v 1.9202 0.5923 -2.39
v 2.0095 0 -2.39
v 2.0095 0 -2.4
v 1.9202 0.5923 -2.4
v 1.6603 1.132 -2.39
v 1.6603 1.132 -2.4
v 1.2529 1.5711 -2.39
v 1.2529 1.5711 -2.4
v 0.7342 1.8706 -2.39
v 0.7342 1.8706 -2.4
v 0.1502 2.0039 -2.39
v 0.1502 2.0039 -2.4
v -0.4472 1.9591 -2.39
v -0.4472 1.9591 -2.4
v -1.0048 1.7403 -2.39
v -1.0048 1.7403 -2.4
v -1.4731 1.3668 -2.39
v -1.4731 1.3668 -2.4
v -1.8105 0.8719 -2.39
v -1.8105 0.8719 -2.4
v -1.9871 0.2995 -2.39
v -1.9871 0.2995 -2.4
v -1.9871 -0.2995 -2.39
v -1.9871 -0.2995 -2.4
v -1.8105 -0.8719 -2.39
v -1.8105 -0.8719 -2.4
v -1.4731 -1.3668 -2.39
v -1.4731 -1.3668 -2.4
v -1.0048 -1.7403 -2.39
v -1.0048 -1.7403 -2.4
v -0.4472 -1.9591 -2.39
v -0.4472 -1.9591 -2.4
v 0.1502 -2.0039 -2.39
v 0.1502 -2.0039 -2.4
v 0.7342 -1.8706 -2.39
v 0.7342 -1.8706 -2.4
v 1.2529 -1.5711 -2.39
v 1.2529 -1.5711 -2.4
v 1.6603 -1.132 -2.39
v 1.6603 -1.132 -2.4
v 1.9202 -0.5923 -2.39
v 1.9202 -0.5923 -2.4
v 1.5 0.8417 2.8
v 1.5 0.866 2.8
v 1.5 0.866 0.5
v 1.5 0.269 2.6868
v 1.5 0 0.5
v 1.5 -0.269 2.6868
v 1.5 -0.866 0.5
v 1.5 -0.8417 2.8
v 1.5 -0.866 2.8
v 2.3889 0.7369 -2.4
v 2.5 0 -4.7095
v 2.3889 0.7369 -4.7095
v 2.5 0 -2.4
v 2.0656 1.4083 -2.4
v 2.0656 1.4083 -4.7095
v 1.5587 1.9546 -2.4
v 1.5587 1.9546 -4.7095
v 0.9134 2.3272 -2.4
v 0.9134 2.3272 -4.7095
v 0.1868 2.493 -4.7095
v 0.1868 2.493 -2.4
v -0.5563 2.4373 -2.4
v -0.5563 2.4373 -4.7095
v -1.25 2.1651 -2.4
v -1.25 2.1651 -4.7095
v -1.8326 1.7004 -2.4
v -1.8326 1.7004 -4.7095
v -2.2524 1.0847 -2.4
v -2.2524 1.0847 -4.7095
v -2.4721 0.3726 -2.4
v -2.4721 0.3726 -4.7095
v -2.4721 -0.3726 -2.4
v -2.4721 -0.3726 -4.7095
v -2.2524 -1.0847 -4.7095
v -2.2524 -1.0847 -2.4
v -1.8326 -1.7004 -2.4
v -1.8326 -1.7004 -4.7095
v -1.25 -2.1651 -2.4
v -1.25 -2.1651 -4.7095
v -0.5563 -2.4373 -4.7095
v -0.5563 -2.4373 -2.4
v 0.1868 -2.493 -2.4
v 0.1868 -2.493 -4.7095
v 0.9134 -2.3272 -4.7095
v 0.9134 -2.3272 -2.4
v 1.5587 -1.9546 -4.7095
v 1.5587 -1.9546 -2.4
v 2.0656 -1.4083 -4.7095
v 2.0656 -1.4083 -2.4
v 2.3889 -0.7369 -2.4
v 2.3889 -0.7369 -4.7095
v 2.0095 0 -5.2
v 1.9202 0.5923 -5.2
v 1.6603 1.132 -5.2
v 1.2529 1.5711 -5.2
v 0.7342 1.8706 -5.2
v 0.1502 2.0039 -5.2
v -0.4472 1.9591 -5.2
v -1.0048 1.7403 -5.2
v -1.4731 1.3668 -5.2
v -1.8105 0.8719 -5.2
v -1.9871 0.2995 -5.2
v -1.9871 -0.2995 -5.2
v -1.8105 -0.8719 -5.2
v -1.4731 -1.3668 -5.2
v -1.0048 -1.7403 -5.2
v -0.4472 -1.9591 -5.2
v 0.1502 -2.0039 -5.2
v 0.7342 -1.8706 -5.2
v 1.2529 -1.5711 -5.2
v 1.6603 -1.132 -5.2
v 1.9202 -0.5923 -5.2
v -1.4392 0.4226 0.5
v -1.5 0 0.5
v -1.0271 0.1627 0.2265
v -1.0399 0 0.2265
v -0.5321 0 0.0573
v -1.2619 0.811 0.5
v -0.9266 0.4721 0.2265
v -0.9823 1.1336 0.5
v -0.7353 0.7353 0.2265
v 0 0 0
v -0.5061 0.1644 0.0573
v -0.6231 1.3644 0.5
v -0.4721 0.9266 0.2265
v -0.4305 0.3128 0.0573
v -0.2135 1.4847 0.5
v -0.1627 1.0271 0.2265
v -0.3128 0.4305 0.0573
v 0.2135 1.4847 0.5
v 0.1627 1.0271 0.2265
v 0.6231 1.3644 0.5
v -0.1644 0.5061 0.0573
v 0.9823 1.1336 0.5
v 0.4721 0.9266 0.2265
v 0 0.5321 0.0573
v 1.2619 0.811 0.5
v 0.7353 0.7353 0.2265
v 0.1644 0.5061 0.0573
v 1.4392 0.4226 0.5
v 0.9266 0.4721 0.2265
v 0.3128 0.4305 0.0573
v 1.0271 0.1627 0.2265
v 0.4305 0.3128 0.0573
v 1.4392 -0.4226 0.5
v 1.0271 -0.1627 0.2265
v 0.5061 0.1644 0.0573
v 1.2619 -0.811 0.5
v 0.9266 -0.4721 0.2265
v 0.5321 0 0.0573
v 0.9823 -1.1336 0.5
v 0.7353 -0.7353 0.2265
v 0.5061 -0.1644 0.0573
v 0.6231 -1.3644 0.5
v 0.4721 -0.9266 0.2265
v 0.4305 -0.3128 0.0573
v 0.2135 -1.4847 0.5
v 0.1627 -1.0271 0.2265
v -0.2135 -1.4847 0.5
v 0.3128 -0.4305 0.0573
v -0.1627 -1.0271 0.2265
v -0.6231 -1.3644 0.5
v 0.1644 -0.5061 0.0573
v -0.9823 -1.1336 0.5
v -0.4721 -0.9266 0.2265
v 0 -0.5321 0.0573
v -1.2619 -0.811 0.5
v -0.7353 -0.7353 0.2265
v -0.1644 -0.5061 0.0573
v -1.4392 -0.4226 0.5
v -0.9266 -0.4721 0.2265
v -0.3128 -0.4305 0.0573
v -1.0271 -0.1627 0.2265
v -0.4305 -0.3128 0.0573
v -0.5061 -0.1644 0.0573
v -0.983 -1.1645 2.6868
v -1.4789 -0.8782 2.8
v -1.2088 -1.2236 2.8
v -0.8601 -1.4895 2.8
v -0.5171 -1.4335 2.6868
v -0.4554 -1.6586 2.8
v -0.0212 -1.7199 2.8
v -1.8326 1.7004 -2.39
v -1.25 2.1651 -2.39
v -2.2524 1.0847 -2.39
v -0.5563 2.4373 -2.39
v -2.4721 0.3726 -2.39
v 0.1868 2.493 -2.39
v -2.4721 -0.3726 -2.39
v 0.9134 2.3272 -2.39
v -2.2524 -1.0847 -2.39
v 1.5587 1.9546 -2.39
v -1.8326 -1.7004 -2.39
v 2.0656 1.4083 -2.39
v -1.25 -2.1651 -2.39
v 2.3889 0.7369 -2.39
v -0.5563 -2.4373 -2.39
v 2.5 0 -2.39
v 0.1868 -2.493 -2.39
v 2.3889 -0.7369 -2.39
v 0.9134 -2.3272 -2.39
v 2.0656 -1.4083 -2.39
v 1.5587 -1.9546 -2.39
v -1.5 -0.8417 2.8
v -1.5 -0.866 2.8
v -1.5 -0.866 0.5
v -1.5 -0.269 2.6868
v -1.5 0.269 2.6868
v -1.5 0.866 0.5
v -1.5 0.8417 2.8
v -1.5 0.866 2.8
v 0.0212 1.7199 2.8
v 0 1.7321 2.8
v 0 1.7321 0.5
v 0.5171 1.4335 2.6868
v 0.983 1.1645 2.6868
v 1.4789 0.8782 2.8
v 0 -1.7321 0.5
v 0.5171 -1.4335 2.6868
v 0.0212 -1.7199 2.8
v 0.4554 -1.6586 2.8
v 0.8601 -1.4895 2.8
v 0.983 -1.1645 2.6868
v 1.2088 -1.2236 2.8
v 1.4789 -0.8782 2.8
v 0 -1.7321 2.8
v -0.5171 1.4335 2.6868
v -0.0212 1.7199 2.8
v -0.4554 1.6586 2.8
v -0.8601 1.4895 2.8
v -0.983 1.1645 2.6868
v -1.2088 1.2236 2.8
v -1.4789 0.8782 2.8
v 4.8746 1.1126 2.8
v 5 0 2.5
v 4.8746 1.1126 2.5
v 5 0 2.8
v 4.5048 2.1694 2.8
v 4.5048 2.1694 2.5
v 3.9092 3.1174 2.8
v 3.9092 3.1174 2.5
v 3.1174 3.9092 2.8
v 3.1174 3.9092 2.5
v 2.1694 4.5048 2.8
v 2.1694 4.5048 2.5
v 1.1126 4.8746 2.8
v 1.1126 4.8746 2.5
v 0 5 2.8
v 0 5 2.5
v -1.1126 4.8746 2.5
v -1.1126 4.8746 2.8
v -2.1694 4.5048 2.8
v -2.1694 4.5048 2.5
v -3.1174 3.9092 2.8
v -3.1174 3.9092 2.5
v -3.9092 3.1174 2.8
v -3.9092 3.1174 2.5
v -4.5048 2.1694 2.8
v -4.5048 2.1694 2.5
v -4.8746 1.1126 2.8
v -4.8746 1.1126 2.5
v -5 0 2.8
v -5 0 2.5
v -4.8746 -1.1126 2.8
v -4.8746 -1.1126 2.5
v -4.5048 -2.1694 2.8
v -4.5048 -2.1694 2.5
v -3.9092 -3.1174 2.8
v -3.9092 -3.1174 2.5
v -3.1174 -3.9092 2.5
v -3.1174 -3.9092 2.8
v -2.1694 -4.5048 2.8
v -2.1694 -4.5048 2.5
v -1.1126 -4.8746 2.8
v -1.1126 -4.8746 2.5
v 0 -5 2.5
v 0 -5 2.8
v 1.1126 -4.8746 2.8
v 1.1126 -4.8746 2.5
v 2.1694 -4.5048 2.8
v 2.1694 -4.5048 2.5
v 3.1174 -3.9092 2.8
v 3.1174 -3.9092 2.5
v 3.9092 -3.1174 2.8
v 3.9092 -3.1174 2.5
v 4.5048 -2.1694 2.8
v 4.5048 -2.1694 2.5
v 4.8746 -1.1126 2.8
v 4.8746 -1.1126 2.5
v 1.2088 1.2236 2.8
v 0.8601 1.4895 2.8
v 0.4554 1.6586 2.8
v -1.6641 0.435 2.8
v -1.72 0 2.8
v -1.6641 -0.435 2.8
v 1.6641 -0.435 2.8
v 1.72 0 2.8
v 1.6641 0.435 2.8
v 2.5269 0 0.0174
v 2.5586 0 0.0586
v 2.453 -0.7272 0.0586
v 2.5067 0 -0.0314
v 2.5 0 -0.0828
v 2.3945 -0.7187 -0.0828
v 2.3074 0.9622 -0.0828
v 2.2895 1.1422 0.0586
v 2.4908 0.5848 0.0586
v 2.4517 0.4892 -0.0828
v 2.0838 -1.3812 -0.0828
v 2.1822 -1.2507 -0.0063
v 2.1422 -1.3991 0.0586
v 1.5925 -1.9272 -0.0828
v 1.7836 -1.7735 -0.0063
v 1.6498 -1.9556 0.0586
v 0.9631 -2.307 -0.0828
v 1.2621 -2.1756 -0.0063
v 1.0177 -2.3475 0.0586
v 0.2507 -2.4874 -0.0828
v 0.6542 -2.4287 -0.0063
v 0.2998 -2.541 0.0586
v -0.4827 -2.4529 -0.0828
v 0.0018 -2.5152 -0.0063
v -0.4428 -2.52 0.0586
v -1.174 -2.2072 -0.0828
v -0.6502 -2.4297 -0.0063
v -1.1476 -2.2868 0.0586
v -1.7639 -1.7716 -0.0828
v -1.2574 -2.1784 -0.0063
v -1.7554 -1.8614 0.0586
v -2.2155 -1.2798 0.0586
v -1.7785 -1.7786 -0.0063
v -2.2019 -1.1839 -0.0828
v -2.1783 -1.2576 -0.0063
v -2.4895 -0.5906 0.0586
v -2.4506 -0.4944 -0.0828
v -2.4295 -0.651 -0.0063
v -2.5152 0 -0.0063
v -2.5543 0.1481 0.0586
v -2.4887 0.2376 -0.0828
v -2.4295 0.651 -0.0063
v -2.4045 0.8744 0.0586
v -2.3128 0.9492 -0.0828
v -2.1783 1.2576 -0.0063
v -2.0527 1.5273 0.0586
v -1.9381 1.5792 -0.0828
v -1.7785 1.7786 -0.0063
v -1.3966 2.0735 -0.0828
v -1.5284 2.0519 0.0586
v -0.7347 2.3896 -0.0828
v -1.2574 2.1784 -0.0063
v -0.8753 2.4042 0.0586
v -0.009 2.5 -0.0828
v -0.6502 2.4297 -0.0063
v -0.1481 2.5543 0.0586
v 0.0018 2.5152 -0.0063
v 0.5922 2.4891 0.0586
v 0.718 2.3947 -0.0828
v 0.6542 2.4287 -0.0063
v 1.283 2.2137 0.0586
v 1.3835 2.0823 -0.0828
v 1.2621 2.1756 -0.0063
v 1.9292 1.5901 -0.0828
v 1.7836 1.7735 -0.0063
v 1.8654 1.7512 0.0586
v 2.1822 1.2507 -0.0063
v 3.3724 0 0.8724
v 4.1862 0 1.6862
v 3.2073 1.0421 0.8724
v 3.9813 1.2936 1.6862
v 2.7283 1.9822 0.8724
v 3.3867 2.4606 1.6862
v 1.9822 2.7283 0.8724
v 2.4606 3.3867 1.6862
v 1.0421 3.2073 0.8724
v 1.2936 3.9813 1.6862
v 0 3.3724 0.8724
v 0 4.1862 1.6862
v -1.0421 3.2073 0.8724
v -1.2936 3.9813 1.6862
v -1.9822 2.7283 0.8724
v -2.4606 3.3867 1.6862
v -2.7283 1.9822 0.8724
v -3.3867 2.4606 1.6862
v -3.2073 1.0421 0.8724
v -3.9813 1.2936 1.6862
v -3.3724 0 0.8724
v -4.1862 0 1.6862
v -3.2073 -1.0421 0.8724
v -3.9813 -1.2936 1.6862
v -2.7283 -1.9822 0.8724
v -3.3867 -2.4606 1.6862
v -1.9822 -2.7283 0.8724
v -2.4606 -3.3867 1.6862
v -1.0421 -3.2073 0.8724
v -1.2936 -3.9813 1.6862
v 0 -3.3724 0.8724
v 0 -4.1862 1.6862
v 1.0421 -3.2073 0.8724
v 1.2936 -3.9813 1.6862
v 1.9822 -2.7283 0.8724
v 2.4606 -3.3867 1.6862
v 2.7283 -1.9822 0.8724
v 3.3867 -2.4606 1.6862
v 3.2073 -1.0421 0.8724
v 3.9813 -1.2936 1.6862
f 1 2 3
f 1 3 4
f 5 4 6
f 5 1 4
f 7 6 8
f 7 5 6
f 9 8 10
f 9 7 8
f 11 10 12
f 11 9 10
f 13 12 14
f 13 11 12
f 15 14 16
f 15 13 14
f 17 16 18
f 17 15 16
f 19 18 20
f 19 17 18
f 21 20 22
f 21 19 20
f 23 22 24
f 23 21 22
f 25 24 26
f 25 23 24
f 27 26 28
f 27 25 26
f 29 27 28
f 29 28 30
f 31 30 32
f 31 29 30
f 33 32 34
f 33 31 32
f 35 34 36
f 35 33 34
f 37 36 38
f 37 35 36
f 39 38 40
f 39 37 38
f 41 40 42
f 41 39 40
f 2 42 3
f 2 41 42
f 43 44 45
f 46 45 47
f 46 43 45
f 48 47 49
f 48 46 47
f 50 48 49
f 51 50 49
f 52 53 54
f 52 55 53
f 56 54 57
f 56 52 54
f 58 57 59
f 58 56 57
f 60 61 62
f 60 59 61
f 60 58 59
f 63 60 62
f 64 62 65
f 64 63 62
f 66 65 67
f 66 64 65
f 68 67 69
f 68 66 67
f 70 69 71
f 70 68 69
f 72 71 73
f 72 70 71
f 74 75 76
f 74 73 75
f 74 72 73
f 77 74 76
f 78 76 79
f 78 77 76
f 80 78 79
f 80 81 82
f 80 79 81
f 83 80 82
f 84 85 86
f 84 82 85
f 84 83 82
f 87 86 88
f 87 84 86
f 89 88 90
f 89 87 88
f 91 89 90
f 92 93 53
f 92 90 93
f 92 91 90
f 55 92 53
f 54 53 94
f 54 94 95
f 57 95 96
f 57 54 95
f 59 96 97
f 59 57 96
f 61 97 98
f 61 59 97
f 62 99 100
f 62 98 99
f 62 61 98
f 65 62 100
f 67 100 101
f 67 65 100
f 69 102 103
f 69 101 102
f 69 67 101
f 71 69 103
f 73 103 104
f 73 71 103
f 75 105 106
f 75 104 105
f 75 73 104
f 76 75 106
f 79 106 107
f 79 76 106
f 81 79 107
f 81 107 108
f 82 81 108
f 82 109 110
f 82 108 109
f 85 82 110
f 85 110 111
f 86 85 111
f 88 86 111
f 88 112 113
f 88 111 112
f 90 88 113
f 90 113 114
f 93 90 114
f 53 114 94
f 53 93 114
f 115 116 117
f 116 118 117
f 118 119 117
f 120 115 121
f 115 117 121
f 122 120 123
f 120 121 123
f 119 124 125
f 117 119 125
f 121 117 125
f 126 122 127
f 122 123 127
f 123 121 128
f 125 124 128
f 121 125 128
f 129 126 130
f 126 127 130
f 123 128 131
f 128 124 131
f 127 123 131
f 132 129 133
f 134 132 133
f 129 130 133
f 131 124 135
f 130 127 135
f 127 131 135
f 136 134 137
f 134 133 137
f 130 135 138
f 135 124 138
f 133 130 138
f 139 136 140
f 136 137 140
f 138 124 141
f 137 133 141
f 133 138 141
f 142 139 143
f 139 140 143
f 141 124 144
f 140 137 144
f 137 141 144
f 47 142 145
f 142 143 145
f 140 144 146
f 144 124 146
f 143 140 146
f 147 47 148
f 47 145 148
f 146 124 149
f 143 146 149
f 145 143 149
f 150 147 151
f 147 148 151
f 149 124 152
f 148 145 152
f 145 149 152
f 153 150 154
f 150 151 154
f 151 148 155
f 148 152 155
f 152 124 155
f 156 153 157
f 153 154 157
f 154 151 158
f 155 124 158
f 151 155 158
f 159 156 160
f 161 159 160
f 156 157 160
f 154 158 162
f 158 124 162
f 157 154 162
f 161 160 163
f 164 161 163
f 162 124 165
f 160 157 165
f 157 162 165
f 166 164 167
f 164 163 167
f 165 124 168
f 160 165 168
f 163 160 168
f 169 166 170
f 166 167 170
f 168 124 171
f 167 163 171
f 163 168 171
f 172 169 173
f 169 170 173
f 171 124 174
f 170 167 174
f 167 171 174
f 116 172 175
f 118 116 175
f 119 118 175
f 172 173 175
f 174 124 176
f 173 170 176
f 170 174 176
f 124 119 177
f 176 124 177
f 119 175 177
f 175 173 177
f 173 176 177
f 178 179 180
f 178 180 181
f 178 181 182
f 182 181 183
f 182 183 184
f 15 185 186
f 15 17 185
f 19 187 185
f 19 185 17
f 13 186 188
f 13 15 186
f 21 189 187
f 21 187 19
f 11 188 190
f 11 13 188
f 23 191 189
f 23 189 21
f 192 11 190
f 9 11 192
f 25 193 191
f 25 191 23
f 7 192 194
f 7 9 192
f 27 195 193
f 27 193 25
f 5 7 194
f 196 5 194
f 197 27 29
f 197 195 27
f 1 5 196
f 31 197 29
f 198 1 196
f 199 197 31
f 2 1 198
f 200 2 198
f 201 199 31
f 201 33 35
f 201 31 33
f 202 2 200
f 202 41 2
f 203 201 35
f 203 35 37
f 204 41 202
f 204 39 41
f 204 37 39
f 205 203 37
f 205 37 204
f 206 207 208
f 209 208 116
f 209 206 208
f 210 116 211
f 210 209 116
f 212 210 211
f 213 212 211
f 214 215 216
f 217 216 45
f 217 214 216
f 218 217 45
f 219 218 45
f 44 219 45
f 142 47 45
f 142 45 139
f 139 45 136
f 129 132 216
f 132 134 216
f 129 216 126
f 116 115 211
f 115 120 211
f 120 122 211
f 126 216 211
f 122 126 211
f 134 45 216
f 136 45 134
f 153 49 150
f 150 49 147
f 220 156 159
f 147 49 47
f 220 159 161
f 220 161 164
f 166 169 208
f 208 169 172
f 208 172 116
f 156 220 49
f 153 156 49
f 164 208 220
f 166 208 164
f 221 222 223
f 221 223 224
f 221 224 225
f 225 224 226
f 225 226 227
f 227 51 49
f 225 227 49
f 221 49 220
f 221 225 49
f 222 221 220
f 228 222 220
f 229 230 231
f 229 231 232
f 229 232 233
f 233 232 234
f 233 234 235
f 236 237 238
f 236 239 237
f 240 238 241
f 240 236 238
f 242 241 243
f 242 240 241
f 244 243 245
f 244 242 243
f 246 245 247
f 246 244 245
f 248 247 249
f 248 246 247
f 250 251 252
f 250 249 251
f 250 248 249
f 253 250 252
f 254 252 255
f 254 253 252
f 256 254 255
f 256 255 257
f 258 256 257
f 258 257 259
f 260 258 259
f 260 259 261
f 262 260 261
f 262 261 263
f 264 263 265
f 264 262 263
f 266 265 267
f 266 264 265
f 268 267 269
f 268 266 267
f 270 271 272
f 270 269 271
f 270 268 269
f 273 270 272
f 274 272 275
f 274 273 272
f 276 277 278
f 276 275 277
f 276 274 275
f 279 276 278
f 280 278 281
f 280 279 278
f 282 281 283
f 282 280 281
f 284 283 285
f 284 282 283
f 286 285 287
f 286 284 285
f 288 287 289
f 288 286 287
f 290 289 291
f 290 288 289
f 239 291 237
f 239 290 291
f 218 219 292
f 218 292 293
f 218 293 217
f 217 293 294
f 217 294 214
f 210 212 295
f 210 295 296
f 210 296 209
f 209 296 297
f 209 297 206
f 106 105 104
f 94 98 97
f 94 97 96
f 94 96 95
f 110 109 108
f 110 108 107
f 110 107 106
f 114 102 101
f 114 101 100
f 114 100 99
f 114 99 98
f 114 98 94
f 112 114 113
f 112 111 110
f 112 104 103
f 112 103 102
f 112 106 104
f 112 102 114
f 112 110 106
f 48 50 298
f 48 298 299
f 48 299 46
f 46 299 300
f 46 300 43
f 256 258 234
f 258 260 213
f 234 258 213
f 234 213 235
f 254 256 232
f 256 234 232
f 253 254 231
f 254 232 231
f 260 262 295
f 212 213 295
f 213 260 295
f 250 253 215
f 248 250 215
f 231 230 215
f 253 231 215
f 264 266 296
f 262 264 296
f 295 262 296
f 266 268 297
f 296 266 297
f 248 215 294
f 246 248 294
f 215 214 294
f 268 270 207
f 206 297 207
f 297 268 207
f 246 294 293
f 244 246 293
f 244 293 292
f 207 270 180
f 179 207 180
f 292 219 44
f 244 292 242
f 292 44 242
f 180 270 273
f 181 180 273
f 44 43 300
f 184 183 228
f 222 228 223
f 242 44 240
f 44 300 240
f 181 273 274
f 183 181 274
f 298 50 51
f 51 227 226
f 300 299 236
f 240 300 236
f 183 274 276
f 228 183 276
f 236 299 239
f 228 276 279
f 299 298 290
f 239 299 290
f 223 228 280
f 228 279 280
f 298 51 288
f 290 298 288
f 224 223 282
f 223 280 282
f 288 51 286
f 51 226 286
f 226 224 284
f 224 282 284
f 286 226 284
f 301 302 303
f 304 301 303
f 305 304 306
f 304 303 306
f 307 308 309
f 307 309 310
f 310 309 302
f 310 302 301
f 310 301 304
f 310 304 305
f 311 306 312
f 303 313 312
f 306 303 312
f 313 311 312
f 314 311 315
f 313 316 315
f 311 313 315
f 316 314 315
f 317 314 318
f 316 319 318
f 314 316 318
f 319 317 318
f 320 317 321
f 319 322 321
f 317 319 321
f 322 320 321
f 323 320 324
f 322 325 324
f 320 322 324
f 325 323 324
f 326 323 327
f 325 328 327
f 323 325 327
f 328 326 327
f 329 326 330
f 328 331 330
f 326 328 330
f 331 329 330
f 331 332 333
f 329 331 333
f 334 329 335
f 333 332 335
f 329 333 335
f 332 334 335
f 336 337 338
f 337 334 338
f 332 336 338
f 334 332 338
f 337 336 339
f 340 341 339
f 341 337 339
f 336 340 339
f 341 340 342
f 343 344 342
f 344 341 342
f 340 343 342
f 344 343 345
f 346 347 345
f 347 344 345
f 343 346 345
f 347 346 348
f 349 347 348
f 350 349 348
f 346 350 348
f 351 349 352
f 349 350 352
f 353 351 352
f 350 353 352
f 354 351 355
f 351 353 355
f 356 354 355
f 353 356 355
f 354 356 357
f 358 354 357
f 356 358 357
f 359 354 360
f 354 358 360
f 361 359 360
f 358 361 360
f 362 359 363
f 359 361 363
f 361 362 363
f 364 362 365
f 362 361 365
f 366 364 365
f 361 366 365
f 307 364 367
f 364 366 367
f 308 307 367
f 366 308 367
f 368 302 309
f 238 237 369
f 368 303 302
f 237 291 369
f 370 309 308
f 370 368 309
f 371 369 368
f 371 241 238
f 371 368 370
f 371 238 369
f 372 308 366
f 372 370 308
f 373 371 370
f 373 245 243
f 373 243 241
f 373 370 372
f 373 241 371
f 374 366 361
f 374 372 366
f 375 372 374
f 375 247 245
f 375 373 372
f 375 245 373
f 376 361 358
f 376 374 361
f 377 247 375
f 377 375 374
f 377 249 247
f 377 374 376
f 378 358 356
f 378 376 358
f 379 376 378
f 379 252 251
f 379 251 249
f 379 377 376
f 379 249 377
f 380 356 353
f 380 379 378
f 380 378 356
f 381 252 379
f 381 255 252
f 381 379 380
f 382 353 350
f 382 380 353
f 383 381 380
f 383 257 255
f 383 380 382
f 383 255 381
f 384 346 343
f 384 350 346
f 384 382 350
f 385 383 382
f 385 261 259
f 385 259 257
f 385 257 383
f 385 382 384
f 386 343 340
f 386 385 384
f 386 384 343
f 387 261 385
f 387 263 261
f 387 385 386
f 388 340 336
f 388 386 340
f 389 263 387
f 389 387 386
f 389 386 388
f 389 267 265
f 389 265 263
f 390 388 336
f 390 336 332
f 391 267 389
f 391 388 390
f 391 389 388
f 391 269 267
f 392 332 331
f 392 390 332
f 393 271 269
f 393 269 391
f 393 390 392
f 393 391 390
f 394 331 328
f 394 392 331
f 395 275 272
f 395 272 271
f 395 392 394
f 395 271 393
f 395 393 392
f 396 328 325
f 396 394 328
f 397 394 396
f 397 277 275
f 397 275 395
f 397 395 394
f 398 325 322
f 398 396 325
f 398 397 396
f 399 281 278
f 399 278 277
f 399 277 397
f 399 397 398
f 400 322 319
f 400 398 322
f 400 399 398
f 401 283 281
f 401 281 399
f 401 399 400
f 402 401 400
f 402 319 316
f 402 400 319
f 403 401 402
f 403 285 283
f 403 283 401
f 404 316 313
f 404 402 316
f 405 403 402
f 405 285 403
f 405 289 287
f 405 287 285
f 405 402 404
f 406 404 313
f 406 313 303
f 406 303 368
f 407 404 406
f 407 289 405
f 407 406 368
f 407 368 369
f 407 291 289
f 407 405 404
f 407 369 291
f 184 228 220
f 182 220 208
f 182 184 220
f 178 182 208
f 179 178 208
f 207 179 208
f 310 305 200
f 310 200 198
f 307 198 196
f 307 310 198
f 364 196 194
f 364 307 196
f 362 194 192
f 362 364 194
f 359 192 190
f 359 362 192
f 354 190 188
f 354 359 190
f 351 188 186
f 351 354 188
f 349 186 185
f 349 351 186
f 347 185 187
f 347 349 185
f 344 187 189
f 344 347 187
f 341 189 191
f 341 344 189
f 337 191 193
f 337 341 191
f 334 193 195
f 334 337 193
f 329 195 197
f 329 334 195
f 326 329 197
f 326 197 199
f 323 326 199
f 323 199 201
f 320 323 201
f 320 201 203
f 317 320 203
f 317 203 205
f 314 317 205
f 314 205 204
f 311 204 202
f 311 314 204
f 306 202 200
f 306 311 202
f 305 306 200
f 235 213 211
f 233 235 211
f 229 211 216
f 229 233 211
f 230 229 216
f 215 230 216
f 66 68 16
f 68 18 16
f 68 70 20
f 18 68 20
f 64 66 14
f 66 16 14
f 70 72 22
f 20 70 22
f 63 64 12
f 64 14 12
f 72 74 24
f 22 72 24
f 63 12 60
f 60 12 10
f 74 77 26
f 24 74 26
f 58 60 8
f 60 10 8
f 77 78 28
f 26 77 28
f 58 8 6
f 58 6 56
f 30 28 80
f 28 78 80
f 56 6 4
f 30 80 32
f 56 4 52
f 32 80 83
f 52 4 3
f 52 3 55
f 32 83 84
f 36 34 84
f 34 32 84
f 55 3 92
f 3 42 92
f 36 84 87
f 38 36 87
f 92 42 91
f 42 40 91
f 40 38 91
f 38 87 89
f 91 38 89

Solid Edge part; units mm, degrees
sketch "Sketch1" plane through (0, 0, 0) normal (0, -1, 0) x (1, 0, 0)
  line L0 (2.5, 0) -> (5, 2.5)
  line L1 (5, 2.5) -> (5, 2.8)
  line L2 (5, 2.8) -> (0, 2.8)
  line L3 (0, 2.8) -> (0, -5.2)
  line L4 (0, -5.2) -> (2.0095, -5.2)
  line L5 (2.0095, -5.2) -> (2.5, -4.7095)
  line L6 (2.5, -4.7095) -> (2.5, -2.4)
  line L7 (2.5, -2.4) -> (2.0095, -2.4)
  line L8 (2.0095, -2.4) -> (2.0095, -2.39)
  line L9 (2.0095, -2.39) -> (2.5, -2.39)
  line L10 (2.5, -2.39) -> (2.5, 0)
  dimension "D1" = 8
  dimension "D2" = 5
  dimension "D3" = 2.8
  dimension "D4" = 0.01
  dimension "D5" = 2.0095
  dimension "D6" = 5.2
  dimension "D7" = 0.3
revolve "RevolvedProtrusion1" add sketch "Sketch1" angle 360 about axis through (0, 0, 54) along (0, 0, -1)
sketch "Sketch2" plane through (0, 0, 0) normal (0, -1, 0) x (1, 0, 0)
  arc A0 (-1.5, 0.5) -> (0, 0) centre (0, 2.5) ccw
  line L0 (0, 0.5) -> (0, 0)
  line L1 (-1.5, 0.5) -> (0, 0.5)
  dimension "D1" = 5.7
revolve "RevolvedCutout1" cut sketch "Sketch2" angle 360 about axis through (0, 0, 54) along (0, 0, -1)
sketch "Sketch3" plane through (0, 0, 2.8) normal (0, 0, 1) x (0, -1, 0)
  line L0 (-1.7321, 0) -> (-0.866, 1.5)
  line L1 (-0.866, 1.5) -> (0.866, 1.5)
  line L2 (0.866, 1.5) -> (1.7321, 0)
  line L3 (1.7321, 0) -> (0.866, -1.5)
  line L4 (0.866, -1.5) -> (-0.866, -1.5)
  line L5 (-0.866, -1.5) -> (-1.7321, 0)
  dimension "D1" = 3
extrude "Cutout1" cut sketch "Sketch3" against normal blind 2.3
cosmetic_thread "Thread1" size "M5"
sketch "Sketch4" plane through (0, 0, 0) normal (1, 0, 0) x (0, 1, 0)
  line L0 (-1.72, 2.8) -> (0, 1.807)
revolve "RevolvedCutout2" cut sketch "Sketch4" angle 360 about axis through (0, 0, -57) along (0, 0, 1) material side at (0, -0.835, 2.3468)
fillet "Round1" radius 0.2 1 edges at (-2.5, 0, 0)
properties material "Stahl"
